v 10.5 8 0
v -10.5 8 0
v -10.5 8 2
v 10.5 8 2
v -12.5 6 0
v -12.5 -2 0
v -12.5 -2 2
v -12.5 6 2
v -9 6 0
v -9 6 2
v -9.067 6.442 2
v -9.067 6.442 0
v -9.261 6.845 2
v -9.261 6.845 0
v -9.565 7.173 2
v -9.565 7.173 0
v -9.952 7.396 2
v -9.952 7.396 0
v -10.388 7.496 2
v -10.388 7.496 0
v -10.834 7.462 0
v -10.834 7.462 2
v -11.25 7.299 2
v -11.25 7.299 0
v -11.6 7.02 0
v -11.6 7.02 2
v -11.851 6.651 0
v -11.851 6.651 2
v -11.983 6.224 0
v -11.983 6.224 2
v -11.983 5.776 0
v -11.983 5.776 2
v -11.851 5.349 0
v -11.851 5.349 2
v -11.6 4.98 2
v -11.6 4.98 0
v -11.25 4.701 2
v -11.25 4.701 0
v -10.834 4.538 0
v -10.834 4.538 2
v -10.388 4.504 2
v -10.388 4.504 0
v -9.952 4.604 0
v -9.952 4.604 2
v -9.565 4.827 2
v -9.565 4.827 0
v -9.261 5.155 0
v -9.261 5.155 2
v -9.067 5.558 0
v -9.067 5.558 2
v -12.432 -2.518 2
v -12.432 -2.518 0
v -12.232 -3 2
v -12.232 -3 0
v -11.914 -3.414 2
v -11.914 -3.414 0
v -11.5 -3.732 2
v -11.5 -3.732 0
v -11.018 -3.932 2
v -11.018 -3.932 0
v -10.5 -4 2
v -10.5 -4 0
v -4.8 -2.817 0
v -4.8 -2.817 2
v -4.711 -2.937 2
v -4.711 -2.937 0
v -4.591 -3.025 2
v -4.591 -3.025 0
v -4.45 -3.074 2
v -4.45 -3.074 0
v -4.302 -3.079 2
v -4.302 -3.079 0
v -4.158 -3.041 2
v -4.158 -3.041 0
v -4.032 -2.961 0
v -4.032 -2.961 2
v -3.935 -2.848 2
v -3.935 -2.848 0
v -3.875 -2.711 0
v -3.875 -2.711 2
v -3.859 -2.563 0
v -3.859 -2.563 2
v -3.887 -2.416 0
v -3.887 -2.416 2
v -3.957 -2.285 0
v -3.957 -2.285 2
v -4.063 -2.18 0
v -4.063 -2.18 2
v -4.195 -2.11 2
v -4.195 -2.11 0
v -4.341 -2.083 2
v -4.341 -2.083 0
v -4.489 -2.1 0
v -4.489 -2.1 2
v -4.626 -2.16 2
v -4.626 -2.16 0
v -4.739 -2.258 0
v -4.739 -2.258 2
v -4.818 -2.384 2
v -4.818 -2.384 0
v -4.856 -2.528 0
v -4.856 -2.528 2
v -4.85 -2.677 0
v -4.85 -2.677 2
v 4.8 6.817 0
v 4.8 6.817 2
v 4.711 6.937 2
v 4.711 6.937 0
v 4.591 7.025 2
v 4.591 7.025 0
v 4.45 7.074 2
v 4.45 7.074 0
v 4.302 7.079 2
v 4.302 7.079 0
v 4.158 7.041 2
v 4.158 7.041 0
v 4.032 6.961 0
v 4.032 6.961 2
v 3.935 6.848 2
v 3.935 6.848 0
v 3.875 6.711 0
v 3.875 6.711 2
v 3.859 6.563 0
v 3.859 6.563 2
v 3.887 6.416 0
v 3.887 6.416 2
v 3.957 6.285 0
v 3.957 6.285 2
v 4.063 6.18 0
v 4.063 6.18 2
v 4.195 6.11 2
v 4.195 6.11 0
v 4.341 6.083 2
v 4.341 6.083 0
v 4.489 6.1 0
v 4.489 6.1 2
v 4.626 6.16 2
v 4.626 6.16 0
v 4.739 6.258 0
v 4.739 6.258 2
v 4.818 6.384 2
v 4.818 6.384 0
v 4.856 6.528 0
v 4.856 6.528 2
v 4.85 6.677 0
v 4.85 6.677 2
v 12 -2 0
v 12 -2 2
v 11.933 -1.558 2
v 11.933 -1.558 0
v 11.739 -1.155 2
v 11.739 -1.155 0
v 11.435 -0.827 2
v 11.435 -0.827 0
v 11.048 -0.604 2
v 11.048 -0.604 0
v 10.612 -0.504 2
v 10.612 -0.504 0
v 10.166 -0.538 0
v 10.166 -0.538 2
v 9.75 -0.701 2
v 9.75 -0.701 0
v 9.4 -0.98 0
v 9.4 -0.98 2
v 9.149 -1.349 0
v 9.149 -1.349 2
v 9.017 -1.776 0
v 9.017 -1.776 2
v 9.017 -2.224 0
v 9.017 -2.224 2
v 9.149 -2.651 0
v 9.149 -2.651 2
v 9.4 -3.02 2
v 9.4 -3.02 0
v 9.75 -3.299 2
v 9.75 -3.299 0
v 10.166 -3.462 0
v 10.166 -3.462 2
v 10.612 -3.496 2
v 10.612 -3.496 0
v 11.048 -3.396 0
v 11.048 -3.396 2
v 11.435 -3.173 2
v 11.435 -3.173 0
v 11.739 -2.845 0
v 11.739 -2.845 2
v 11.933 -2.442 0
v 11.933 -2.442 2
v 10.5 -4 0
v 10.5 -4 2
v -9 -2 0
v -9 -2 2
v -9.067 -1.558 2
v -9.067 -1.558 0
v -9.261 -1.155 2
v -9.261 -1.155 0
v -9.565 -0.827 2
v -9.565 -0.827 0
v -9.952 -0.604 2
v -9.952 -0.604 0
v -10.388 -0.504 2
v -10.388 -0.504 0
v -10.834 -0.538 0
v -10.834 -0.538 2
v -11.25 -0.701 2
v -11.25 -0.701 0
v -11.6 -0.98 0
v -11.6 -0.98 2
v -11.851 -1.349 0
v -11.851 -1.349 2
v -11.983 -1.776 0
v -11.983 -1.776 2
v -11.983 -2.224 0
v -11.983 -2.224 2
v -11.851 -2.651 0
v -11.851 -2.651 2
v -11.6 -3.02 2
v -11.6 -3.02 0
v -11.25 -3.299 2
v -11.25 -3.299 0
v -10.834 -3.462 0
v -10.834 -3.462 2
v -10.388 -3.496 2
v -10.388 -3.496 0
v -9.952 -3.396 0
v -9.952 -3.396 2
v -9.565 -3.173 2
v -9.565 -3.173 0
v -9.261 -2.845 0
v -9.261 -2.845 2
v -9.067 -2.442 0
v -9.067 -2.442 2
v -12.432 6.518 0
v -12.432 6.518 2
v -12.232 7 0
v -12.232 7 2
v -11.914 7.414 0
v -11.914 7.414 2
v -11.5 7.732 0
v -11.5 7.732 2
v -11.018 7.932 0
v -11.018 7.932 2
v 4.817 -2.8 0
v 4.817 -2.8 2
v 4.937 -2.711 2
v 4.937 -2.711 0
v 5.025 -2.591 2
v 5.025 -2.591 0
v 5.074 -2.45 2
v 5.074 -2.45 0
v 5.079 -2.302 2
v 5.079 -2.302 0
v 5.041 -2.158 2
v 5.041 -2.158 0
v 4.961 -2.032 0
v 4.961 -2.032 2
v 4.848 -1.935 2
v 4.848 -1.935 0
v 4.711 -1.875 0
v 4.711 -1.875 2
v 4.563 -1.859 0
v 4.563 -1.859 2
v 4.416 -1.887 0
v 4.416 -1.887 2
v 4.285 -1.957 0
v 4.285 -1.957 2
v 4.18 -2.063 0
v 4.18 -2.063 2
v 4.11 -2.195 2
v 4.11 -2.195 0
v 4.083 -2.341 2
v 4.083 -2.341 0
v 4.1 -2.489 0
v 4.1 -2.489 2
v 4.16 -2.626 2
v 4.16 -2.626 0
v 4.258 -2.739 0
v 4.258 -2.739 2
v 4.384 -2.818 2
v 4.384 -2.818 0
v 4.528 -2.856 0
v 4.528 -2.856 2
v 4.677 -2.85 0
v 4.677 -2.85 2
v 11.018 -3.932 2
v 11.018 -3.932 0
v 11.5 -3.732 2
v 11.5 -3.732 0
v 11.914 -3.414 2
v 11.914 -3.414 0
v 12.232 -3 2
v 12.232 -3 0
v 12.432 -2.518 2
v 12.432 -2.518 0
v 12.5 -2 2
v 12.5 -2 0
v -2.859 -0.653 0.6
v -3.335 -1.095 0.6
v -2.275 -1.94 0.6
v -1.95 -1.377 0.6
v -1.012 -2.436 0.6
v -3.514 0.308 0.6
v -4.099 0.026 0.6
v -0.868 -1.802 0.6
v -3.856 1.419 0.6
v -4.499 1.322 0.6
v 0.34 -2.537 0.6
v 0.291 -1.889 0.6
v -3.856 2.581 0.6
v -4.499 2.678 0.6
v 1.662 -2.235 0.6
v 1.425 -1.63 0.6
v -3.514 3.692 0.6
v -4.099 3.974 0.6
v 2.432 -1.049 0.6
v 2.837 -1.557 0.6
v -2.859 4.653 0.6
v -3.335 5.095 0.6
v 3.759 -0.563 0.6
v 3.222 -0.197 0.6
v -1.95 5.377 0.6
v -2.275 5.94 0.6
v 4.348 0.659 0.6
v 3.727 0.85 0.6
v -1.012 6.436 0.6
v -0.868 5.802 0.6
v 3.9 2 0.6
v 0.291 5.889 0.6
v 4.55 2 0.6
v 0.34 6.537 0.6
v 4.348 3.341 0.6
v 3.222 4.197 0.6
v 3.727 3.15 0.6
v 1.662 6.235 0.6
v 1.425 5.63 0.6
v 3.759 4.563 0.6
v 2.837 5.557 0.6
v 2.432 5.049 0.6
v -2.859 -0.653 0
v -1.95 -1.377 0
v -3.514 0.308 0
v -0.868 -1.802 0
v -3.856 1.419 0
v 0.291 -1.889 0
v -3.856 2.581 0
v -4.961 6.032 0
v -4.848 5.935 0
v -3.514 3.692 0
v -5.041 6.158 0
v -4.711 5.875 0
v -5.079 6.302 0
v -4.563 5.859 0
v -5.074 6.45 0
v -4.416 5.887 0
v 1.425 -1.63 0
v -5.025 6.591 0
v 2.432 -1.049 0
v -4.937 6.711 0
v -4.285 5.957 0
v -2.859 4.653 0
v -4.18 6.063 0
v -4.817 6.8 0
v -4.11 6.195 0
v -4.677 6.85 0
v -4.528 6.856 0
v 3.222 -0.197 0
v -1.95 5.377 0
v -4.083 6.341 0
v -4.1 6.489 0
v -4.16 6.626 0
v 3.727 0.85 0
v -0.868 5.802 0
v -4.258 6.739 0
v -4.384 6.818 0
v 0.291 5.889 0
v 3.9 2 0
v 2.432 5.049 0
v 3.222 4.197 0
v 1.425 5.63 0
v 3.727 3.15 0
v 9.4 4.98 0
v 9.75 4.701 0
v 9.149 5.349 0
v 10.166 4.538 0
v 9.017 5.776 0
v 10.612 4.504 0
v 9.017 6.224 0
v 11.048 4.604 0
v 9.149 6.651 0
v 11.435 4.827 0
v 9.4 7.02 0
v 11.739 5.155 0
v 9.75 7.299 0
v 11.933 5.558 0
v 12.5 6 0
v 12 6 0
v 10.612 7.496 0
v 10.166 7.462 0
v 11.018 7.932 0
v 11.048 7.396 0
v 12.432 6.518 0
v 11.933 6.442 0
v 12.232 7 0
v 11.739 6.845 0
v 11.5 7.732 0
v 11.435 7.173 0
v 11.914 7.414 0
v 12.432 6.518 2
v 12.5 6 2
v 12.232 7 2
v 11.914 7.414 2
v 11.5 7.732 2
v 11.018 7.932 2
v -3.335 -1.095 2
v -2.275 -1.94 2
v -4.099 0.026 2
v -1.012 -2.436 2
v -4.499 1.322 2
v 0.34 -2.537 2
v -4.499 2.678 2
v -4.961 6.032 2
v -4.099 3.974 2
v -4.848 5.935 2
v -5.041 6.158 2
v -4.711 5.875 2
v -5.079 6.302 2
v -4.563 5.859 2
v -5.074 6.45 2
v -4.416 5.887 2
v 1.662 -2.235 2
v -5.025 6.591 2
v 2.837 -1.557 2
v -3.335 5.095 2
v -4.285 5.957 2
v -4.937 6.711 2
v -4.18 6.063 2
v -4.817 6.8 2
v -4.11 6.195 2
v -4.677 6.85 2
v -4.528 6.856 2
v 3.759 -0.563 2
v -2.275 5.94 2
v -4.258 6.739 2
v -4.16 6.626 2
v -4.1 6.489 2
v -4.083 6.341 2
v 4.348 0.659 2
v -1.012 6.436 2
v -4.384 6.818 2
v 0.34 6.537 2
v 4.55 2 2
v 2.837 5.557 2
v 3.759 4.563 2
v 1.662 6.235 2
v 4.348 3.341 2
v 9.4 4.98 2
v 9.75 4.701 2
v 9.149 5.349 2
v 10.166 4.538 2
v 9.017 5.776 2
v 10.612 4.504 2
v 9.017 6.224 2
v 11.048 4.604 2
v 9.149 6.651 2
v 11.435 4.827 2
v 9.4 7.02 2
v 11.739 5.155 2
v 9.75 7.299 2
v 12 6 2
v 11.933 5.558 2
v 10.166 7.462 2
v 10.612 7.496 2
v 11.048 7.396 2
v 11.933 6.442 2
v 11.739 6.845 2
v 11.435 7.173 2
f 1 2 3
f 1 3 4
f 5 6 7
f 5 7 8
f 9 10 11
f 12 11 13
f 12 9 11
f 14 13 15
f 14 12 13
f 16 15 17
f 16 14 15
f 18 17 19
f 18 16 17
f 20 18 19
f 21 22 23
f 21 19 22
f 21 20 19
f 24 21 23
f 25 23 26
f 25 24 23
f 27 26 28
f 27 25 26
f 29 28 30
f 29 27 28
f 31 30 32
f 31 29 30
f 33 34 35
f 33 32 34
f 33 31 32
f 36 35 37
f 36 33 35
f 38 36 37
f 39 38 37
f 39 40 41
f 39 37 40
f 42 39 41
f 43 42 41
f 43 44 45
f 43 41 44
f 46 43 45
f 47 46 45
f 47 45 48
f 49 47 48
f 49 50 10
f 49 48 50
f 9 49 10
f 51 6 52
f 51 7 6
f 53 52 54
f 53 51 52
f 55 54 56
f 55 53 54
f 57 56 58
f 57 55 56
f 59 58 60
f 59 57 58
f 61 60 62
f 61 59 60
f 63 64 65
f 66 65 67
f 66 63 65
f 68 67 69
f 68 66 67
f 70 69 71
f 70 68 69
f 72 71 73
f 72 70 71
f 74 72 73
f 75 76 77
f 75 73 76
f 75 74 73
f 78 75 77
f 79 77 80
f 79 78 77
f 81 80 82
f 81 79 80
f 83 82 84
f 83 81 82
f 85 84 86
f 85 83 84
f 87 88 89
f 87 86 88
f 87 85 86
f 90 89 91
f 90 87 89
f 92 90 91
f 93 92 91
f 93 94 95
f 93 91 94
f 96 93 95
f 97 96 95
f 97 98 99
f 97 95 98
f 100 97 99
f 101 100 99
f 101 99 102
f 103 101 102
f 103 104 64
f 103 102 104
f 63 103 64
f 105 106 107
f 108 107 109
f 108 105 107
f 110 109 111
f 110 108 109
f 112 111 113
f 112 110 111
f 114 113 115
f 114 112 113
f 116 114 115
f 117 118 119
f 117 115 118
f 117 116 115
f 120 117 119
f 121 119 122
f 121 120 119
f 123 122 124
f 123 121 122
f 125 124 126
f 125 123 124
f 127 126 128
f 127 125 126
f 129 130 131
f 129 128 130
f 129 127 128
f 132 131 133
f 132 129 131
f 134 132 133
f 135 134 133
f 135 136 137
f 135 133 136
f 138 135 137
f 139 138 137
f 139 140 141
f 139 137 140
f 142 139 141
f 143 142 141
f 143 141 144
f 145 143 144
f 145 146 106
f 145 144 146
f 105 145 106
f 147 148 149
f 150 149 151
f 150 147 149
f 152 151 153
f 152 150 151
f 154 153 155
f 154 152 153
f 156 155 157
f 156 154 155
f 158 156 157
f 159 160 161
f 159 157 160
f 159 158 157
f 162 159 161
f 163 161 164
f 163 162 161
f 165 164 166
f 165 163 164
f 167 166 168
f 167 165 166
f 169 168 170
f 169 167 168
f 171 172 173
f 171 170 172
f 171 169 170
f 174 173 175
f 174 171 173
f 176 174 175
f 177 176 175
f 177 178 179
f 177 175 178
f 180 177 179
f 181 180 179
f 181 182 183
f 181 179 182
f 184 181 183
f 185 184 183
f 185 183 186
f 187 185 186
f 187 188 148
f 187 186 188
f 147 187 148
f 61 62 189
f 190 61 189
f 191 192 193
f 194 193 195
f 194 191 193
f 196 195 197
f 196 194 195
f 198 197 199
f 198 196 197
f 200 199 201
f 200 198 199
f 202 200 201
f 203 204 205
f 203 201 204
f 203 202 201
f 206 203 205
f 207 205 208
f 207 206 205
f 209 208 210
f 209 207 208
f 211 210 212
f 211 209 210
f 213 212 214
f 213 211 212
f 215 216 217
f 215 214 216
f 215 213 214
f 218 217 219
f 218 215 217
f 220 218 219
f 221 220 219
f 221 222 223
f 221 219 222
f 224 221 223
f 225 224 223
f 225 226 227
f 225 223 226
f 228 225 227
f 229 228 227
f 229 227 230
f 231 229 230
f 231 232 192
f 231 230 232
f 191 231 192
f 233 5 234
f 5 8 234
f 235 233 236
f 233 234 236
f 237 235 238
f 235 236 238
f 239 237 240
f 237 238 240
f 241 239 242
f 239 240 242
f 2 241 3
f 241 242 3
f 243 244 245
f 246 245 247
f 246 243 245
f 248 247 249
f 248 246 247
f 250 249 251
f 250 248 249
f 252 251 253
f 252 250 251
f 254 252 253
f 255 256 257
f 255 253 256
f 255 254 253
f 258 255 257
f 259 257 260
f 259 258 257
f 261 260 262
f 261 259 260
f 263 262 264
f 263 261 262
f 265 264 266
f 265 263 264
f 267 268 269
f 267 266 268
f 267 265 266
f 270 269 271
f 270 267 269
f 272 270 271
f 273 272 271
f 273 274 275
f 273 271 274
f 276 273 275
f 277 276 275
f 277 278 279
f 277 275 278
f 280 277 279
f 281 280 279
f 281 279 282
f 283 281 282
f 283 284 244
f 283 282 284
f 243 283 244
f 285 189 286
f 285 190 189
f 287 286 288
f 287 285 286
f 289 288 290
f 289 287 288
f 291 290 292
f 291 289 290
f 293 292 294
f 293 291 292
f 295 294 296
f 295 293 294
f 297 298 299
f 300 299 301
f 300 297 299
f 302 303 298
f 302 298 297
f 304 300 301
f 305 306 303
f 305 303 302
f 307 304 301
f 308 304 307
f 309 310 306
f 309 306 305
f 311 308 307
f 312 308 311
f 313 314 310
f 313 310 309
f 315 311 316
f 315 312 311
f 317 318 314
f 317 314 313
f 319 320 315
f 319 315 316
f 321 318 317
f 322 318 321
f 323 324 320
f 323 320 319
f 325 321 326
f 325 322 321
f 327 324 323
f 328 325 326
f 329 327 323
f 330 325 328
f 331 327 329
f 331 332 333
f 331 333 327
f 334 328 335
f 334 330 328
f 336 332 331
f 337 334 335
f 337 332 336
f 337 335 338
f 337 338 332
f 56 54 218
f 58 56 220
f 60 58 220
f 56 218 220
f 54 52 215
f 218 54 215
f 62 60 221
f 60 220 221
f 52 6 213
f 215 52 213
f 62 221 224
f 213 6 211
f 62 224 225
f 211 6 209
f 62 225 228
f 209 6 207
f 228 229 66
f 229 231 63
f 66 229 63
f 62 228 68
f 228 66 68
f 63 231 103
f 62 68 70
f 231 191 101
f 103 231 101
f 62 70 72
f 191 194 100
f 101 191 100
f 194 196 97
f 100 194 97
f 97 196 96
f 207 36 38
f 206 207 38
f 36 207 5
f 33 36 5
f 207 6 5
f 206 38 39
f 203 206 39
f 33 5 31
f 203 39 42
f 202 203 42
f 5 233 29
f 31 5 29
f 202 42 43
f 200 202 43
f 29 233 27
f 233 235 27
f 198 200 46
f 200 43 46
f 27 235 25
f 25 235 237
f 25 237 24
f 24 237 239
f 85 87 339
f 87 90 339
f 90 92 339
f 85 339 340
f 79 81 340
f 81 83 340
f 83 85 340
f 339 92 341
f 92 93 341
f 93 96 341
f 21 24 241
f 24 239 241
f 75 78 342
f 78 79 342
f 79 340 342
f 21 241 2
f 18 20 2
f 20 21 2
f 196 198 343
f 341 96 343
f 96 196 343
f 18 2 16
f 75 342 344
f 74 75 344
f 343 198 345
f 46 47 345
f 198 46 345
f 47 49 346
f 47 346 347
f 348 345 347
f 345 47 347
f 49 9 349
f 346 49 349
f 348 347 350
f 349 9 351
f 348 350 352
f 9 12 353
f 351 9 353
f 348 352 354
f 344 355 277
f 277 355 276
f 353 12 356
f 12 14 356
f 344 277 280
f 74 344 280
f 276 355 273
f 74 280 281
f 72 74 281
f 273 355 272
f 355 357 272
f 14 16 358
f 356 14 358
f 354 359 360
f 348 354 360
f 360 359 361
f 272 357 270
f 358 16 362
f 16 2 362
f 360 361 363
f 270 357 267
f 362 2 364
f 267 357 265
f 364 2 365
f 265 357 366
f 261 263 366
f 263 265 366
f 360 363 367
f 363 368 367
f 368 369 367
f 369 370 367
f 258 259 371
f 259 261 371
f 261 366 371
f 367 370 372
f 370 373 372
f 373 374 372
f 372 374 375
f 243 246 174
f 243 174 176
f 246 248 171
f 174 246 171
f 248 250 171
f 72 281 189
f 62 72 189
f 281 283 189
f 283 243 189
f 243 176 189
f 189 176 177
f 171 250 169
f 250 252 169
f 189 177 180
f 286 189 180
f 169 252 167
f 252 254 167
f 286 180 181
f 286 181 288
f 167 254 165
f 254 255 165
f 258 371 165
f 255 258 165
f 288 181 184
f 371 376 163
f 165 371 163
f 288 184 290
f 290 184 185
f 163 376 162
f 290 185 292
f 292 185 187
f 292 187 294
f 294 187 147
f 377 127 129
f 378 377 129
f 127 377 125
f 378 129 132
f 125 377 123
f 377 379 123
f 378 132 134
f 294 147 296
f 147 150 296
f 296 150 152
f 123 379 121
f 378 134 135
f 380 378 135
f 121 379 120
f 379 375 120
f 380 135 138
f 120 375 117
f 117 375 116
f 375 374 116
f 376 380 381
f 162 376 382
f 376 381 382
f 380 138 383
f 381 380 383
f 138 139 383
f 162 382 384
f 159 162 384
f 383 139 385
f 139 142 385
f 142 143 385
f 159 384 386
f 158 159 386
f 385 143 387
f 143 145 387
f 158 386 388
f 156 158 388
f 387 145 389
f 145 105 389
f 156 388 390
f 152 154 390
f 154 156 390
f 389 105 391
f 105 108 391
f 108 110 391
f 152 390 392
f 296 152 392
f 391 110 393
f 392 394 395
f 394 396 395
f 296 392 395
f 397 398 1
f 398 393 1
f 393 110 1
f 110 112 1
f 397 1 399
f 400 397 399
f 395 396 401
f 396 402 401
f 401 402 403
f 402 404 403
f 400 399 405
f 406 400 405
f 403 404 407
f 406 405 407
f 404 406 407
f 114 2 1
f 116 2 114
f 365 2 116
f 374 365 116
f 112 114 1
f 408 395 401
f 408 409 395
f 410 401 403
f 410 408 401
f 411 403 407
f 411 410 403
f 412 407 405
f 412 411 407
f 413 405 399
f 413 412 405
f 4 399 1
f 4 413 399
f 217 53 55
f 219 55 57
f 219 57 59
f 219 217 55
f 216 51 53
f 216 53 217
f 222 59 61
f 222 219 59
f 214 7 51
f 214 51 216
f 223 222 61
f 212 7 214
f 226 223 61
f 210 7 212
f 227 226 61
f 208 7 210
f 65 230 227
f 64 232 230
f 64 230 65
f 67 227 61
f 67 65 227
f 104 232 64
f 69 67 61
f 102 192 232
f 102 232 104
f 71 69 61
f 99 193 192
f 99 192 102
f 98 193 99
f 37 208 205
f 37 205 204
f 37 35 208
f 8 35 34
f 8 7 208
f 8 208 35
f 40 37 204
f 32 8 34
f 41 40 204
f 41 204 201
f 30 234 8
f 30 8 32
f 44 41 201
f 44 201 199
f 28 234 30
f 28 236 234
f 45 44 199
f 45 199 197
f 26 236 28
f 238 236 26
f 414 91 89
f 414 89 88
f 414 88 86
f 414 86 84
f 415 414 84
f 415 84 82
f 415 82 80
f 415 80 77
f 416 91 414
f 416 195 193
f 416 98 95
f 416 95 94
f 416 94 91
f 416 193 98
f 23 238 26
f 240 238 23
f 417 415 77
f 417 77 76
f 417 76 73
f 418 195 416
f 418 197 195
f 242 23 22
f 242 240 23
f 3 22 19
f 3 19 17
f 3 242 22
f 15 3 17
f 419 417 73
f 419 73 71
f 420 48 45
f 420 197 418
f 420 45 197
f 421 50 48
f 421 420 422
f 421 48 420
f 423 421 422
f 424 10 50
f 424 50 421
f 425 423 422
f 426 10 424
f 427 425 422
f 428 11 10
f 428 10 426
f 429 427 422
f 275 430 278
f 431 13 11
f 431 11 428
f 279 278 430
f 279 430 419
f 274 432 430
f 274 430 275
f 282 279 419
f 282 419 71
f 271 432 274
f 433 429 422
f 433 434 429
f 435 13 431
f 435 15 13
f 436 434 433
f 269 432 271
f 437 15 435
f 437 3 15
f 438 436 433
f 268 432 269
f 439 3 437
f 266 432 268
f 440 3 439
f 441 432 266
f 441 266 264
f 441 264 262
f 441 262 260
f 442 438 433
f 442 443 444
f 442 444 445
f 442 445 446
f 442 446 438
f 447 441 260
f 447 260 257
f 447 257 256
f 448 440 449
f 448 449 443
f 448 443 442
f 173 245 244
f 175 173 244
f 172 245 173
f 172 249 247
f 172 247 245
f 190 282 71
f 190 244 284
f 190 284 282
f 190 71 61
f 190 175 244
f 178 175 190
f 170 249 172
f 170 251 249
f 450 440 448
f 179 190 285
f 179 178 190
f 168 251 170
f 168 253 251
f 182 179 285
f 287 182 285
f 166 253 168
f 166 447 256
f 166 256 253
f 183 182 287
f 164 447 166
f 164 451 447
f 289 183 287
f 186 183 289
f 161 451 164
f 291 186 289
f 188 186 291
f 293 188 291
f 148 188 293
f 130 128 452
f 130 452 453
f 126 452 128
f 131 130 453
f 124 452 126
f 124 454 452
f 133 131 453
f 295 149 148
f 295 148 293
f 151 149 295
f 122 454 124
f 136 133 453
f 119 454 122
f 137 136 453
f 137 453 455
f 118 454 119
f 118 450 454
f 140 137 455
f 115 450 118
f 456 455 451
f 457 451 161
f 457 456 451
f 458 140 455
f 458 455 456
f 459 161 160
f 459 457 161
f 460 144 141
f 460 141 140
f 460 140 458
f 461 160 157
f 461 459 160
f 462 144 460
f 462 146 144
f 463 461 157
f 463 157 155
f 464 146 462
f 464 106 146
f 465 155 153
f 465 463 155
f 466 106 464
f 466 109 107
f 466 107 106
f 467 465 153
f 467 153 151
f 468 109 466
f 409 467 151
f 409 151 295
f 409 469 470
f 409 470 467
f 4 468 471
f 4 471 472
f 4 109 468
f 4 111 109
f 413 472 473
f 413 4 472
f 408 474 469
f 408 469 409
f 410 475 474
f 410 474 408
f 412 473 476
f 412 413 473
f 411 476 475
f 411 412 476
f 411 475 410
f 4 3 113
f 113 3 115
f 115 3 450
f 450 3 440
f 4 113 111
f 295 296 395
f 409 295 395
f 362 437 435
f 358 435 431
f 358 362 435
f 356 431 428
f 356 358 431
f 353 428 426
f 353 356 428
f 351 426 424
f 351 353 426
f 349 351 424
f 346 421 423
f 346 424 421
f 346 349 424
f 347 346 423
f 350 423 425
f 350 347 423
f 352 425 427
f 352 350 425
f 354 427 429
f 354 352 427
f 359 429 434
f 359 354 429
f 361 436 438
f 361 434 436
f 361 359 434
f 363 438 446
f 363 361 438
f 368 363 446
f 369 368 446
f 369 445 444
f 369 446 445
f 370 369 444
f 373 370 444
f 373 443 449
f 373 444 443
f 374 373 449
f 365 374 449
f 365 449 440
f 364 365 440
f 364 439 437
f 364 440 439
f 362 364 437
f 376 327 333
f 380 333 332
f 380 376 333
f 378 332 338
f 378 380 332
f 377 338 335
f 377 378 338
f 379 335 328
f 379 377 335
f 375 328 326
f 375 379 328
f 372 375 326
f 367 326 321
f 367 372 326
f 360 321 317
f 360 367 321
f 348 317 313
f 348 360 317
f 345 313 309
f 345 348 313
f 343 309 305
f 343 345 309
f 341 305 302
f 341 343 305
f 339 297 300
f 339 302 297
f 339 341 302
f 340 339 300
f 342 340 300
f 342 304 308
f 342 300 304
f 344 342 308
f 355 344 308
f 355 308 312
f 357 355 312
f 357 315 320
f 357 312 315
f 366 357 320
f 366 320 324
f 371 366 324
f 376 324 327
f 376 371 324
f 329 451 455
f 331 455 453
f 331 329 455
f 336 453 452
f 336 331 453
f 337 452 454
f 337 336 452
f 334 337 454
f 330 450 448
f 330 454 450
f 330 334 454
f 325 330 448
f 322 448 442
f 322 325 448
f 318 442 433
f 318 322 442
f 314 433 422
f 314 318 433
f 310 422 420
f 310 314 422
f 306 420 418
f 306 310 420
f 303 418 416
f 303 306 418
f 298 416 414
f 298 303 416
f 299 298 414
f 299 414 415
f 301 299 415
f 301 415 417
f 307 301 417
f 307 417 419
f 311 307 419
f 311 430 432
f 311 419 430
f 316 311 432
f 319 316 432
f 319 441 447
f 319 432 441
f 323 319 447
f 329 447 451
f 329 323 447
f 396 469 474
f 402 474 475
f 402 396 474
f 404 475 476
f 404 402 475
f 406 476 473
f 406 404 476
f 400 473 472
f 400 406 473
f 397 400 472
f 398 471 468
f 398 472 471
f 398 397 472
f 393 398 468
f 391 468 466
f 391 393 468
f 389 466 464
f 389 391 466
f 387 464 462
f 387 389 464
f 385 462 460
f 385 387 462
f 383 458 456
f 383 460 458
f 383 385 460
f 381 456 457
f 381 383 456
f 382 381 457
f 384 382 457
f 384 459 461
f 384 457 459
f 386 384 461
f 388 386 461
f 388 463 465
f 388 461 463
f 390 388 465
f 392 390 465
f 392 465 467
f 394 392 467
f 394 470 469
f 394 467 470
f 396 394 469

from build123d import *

# Parameters (mm, degrees)
CYLINDER065_R            = 0.5
CYLINDER065_DEPTH        = 10
ARRAY016_COUNT           = 4
ARRAY016_PLACEMENT_ANGLE = 28
CYLINDER060_R            = 4.55
CYLINDER060_DEPTH        = 10
CYLINDER059_R            = 3.9
CYLINDER059_DEPTH        = 10
CYLINDER063_R            = 1.5
CYLINDER063_DEPTH        = 10
ARRAY018_X_COUNT         = 2
ARRAY018_X_PITCH         = 21
ARRAY018_Y_COUNT         = 2
ARRAY018_Y_PITCH         = 8
BOX008_W                 = 25
BOX008_H                 = 12
BOX008_DEPTH             = 2
FILLET008_R              = 2


with BuildPart() as array016:
    # Cylinder065 → Cylinder065 (new body)
    with BuildSketch(Plane(origin=(6, 2, 0), x_dir=(1, 0, 0), z_dir=(0, 0, 1))):
        Circle(CYLINDER065_R)
    extrude(amount=CYLINDER065_DEPTH)

    # Array016: Array016 ×4 about axis
    array016_axis = Axis((0, 0, 0), (0, 0, 1))


with BuildPart() as array016_1:
    add(array016.part)
    for i in range(1, ARRAY016_COUNT):
        add(array016.part.rotate(array016_axis, i * 360 / ARRAY016_COUNT))


with BuildPart() as array016_2:
    # Array016 placement: moved
    add(array016_1.part.rotate(Axis((0, 0, 0), (0, 0, 1)), ARRAY016_PLACEMENT_ANGLE))


with BuildPart() as mountplatelip005:
    # Cylinder060 → Cylinder060 (new body)
    with BuildSketch(Plane.XY.offset(0.6)):
        Circle(CYLINDER060_R)
    extrude(amount=CYLINDER060_DEPTH)


with BuildPart() as mountplateinnerhole004:
    # Cylinder059 → Cylinder059 (new body)
    with BuildSketch(Plane.XY):
        Circle(CYLINDER059_R)
    extrude(amount=CYLINDER059_DEPTH)


with BuildPart() as fusion020:
    # Cylinder063 → Cylinder063 (new body)
    with BuildSketch(Plane.XY):
        Circle(CYLINDER063_R)
    extrude(amount=CYLINDER063_DEPTH)

    # Array018 X: Fusion020 ×2


with BuildPart() as fusion020_1:
    add(fusion020.part)
    with Locations(*[(i * ARRAY018_X_PITCH, 0, 0) for i in range(1, ARRAY018_X_COUNT)]):
        add(fusion020.part)

    # Array018 Y: Fusion020 ×2


with BuildPart() as fusion020_2:
    add(fusion020_1.part)
    with Locations(*[(0, i * ARRAY018_Y_PITCH, 0) for i in range(1, ARRAY018_Y_COUNT)]):
        add(fusion020_1.part)


with BuildPart() as fusion020_3:
    # Array018 placement: moved
    add(fusion020_2.part.moved(Location((-10.5, -4, 0))))

    # Fusion020: union Array016, MountPlateLip005, MountPlateInnerHole004
    add(array016_2.part)
    add(mountplatelip005.part)
    add(mountplateinnerhole004.part)


with BuildPart() as backplate:
    # Box008 → Box008 (new body)
    with BuildSketch(Plane(origin=(-12.5, -6, 0), x_dir=(1, 0, 0), z_dir=(0, 0, 1))):
        with Locations((12.5, 6)):
            Rectangle(BOX008_W, BOX008_H)
    extrude(amount=BOX008_DEPTH)

    # Fillet008
    fillet008_edges = [backplate.edges().sort_by_distance(p)[0] for p in [
        (-12.5, -6, 1),
        (-12.5, 6, 1),
        (12.5, -6, 1),
        (12.5, 6, 1),
    ]]
    fillet(fillet008_edges, radius=FILLET008_R)

    # Cut023: cut Fusion020
    add(fusion020_3.part, mode=Mode.SUBTRACT)


with BuildPart() as backplate_1:
    # Cut023 placement: moved
    add(backplate.part.moved(Location((0, 2, 0))))


solid = backplate_1.part
